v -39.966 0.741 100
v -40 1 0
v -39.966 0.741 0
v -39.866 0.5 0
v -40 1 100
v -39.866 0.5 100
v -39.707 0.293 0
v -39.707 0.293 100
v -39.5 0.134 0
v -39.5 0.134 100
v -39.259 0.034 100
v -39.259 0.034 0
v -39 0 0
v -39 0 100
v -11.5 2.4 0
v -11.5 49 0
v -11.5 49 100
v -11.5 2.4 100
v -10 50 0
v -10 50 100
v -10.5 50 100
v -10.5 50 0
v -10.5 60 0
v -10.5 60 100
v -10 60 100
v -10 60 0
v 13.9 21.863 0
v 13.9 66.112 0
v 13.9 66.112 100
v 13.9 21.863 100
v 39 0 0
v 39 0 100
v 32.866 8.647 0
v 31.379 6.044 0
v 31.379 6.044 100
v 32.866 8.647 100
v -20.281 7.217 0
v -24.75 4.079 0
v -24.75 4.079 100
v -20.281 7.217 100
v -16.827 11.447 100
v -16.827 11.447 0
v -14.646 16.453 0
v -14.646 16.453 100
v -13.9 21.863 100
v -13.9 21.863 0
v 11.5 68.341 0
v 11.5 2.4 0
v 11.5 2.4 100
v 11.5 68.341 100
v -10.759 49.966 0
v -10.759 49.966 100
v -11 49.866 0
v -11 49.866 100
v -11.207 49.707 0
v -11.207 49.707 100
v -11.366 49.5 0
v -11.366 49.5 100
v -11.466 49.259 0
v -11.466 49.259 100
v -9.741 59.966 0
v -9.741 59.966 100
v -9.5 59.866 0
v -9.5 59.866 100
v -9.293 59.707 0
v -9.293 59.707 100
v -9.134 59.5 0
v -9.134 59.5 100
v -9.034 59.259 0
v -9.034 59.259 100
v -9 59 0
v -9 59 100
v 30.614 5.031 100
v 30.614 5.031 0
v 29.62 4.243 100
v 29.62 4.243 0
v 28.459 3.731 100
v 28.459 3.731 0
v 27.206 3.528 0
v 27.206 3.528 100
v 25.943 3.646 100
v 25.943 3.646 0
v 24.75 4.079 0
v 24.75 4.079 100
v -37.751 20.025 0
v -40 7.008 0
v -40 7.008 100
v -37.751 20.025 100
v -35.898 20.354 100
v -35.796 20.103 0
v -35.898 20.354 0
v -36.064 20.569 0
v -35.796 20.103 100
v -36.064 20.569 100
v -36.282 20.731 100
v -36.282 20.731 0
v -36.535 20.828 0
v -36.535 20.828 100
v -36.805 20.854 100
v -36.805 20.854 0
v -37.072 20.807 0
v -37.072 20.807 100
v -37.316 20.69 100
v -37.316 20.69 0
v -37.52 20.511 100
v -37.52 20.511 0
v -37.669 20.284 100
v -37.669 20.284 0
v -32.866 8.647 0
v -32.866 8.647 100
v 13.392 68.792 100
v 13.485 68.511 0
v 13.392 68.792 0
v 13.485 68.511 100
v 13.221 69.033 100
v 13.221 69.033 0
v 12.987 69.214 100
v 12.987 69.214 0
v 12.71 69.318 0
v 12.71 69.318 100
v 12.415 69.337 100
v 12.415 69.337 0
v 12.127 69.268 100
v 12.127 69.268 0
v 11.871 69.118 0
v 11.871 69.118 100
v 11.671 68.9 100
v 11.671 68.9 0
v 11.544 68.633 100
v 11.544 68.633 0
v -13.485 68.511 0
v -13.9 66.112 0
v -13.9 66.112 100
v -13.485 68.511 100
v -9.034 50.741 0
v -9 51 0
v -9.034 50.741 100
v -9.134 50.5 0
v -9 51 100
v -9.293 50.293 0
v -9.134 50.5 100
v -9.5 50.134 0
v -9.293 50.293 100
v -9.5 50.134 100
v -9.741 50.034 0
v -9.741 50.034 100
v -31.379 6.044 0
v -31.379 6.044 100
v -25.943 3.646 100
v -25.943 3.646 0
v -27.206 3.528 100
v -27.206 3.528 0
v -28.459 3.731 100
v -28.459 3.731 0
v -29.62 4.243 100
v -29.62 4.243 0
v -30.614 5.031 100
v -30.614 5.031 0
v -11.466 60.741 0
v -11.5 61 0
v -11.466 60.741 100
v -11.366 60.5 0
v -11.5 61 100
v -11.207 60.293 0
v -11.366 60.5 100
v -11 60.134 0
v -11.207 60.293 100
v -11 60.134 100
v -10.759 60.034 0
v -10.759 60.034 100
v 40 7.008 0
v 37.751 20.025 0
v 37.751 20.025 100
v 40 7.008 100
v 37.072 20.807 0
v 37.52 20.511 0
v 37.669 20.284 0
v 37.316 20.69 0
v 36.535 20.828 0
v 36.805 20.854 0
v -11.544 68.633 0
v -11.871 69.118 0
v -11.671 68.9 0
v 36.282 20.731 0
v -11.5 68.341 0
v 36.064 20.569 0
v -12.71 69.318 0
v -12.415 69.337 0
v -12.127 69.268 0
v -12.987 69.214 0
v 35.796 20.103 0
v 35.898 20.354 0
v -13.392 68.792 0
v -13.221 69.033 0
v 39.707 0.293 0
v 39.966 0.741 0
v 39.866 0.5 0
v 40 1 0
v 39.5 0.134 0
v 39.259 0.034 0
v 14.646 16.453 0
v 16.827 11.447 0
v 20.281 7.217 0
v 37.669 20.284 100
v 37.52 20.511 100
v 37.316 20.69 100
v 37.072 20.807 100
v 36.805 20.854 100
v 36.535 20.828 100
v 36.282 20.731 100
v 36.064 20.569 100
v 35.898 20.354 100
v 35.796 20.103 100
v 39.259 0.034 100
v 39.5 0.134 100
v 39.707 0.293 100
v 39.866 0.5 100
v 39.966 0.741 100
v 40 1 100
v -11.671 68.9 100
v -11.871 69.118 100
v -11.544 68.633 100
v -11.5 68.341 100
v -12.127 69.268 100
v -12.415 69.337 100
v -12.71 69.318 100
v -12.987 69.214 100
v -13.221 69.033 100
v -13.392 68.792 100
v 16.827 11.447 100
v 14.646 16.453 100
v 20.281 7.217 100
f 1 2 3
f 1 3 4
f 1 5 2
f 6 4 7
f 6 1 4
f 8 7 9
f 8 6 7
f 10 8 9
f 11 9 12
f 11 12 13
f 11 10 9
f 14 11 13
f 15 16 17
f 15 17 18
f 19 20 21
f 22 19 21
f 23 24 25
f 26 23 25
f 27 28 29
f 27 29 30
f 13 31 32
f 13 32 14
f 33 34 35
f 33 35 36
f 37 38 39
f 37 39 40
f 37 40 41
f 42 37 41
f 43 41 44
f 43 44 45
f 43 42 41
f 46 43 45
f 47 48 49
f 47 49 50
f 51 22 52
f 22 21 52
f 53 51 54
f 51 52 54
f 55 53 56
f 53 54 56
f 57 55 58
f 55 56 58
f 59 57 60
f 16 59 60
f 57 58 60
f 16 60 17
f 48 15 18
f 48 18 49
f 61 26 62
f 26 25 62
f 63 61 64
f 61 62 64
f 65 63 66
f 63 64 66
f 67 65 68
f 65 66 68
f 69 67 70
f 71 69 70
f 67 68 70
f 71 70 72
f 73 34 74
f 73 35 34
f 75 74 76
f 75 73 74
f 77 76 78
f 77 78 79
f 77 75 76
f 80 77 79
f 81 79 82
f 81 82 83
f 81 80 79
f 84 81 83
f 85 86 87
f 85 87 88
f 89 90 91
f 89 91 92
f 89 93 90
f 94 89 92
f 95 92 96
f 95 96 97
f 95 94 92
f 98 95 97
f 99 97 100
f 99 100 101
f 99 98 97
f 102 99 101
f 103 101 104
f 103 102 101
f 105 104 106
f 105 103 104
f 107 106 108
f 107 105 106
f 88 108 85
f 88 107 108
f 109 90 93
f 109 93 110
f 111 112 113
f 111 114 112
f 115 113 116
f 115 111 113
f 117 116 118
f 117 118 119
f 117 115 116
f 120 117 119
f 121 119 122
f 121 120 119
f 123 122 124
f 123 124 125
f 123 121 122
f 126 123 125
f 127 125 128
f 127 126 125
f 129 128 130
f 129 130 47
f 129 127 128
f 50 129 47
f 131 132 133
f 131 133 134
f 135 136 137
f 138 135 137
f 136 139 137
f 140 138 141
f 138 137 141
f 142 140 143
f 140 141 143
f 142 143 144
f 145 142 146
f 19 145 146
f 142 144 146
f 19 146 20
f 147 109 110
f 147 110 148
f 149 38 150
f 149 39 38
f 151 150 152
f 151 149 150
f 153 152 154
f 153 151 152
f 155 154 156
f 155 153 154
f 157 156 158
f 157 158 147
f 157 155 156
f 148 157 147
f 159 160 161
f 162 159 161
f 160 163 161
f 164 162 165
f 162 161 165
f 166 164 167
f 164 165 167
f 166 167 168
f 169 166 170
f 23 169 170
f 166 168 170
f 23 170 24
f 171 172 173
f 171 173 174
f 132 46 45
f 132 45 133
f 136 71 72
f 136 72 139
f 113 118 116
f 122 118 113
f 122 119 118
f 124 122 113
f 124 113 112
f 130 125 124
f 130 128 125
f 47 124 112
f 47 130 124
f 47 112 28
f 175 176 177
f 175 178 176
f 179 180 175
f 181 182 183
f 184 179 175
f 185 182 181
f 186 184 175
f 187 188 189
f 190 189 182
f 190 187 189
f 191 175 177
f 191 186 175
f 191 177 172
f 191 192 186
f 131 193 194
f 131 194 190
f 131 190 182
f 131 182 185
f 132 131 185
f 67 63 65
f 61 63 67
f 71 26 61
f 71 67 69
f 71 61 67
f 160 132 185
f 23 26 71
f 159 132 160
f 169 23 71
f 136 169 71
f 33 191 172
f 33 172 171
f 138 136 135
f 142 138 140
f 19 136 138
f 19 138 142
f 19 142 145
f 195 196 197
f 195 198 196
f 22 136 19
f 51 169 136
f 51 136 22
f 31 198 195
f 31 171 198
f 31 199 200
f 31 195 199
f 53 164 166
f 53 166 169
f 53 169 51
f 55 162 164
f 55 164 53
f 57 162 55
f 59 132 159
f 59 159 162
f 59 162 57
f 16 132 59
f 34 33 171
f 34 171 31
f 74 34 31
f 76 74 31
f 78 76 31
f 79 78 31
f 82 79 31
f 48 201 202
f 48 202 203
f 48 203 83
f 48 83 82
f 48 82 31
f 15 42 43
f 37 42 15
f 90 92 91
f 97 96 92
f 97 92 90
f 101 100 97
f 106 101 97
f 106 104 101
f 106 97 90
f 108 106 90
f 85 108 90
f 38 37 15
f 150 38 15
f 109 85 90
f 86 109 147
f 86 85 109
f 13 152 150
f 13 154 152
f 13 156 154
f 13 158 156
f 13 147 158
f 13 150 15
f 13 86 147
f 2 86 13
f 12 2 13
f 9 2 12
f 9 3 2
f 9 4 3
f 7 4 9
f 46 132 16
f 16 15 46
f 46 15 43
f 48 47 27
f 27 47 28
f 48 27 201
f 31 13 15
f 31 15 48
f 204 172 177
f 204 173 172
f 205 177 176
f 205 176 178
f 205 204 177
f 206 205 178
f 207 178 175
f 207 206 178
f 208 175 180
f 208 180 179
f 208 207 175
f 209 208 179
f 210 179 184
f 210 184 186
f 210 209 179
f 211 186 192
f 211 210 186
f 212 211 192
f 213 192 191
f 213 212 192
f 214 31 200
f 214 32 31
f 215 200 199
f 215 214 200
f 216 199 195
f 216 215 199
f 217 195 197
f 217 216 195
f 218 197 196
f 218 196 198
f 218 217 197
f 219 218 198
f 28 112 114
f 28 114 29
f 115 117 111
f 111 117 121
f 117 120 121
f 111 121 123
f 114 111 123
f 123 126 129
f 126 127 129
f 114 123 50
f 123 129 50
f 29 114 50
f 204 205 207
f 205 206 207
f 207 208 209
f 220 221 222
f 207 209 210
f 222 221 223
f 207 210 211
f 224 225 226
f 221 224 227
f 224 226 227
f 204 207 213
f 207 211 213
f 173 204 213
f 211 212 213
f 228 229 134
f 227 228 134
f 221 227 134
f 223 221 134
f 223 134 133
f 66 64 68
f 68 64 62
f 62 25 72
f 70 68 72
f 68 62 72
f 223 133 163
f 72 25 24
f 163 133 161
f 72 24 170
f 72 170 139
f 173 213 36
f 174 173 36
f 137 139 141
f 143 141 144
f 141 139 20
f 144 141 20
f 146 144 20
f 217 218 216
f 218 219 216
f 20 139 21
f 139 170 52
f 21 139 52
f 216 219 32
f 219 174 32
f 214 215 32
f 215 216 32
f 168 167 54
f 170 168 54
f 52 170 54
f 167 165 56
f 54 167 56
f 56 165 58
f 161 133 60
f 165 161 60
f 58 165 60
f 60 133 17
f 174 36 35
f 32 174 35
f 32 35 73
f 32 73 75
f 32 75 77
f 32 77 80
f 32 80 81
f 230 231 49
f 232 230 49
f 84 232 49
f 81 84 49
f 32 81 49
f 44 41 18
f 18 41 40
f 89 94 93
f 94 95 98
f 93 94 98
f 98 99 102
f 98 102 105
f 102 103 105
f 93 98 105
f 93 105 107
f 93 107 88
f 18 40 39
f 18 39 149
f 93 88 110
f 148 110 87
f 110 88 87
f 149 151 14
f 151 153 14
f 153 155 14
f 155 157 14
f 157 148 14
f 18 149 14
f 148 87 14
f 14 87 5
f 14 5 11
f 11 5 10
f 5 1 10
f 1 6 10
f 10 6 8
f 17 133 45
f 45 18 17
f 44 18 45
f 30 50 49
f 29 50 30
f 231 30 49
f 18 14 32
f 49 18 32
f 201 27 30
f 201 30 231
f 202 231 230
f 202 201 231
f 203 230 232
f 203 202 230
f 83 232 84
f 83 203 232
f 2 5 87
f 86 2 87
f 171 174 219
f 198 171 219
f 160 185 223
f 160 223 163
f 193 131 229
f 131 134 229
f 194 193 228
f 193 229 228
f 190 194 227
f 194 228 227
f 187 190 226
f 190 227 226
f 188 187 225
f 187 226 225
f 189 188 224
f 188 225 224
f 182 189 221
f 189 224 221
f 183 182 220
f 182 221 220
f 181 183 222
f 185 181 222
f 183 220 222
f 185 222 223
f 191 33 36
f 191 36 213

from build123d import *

# Parameters (mm, degrees)
BOSS_EXTRU_1_DEPTH = 100
CONG_2_R           = 1
CONGES_BASE_R      = 20
CONG_4_R           = 1
CONG_5_R           = 5


with BuildPart() as part:
    # Esquisse1 → Boss.-Extru.1 (new body)
    with BuildSketch(Plane.XY):
        Polygon((-11.5, 2.4), (11.5, 2.4), (11.5, 80), (13.9, 66.111581736), (13.9, 2.4), (29.296036477, 2.4), (32.866170168, 8.646815683), (36.954561628, 24.631379819), (40, 7.007912357), (40, 0), (-40, 0), (-40, 7.007912357), (-36.954561628, 24.631379819), (-32.866170168, 8.646815683), (-29.296036477, 2.4), (-13.9, 2.4), (-13.9, 66.111581736), (-11.5, 80), (-11.5, 60), (-9, 60), (-9, 50), (-11.5, 50), align=None)
    extrude(amount=BOSS_EXTRU_1_DEPTH)

    # Congé2
    cong_2_edges = [part.edges().sort_by_distance(p)[0] for p in [
        (-11.5, 60, 50),
        (-9, 60, 50),
        (-9, 50, 50),
        (-11.5, 50, 50),
    ]]
    fillet(cong_2_edges, radius=CONG_2_R)

    # Conges_base
    # the kernel refuses this fillet: 20 mm, written as the material it adds along each edge
    with BuildSketch(Plane(origin=(13.9, 2.4, 0), x_dir=(0, 1, 0), z_dir=(0, 0, 1))) as conges_base_piece_1:
        with BuildLine():
            CenterArc((19.462875427, -20), CONGES_BASE_R, 90, 76.691260518)
            Line((0, -15.396036477), (-0.389257509, -15.303957207))
            ThreePointArc((-0.389257509, -15.303957207), (-0.4, -7.698018239), (-0.4, 0))
            Line((-0.4, 0), (0, 0.4))
            Line((0, 0.4), (19.462875427, 0.4))
            Line((19.462875427, 0.4), (19.462875427, 0))
        make_face()
    extrude(amount=100)
    with BuildSketch(Plane(origin=(-13.9, 2.4, 0), x_dir=(0, 1, 0), z_dir=(0, 0, 1))) as conges_base_piece_2:
        with BuildLine():
            CenterArc((19.462875427, 20), CONGES_BASE_R, 193.308739482, 76.691260518)
            Line((0, 15.396036477), (-0.389257509, 15.303957207))
            ThreePointArc((-0.389257509, 15.303957207), (-0.4, 7.698018239), (-0.4, 0))
            Line((-0.4, 0), (0, -0.4))
            Line((0, -0.4), (19.462875427, -0.4))
            Line((19.462875427, -0.4), (19.462875427, 0))
        make_face()
    extrude(amount=100)

    # Congé4
    cong_4_edges = [part.edges().sort_by_distance(p)[0] for p in [
        (11.5, 80, 50),
        (36.954561628, 24.631379819, 50),
        (40, 0, 50),
        (-40, 0, 50),
        (-36.954561628, 24.631379819, 50),
        (-11.5, 80, 50),
    ]]
    fillet(cong_4_edges, radius=CONG_4_R)

    # Congé5
    cong_5_edges = [part.edges().sort_by_distance(p)[0] for p in [
        (29.296036477, 2.4, 50),
        (-29.296036477, 2.4, 50),
    ]]
    fillet(cong_5_edges, radius=CONG_5_R)


solid = part.part
